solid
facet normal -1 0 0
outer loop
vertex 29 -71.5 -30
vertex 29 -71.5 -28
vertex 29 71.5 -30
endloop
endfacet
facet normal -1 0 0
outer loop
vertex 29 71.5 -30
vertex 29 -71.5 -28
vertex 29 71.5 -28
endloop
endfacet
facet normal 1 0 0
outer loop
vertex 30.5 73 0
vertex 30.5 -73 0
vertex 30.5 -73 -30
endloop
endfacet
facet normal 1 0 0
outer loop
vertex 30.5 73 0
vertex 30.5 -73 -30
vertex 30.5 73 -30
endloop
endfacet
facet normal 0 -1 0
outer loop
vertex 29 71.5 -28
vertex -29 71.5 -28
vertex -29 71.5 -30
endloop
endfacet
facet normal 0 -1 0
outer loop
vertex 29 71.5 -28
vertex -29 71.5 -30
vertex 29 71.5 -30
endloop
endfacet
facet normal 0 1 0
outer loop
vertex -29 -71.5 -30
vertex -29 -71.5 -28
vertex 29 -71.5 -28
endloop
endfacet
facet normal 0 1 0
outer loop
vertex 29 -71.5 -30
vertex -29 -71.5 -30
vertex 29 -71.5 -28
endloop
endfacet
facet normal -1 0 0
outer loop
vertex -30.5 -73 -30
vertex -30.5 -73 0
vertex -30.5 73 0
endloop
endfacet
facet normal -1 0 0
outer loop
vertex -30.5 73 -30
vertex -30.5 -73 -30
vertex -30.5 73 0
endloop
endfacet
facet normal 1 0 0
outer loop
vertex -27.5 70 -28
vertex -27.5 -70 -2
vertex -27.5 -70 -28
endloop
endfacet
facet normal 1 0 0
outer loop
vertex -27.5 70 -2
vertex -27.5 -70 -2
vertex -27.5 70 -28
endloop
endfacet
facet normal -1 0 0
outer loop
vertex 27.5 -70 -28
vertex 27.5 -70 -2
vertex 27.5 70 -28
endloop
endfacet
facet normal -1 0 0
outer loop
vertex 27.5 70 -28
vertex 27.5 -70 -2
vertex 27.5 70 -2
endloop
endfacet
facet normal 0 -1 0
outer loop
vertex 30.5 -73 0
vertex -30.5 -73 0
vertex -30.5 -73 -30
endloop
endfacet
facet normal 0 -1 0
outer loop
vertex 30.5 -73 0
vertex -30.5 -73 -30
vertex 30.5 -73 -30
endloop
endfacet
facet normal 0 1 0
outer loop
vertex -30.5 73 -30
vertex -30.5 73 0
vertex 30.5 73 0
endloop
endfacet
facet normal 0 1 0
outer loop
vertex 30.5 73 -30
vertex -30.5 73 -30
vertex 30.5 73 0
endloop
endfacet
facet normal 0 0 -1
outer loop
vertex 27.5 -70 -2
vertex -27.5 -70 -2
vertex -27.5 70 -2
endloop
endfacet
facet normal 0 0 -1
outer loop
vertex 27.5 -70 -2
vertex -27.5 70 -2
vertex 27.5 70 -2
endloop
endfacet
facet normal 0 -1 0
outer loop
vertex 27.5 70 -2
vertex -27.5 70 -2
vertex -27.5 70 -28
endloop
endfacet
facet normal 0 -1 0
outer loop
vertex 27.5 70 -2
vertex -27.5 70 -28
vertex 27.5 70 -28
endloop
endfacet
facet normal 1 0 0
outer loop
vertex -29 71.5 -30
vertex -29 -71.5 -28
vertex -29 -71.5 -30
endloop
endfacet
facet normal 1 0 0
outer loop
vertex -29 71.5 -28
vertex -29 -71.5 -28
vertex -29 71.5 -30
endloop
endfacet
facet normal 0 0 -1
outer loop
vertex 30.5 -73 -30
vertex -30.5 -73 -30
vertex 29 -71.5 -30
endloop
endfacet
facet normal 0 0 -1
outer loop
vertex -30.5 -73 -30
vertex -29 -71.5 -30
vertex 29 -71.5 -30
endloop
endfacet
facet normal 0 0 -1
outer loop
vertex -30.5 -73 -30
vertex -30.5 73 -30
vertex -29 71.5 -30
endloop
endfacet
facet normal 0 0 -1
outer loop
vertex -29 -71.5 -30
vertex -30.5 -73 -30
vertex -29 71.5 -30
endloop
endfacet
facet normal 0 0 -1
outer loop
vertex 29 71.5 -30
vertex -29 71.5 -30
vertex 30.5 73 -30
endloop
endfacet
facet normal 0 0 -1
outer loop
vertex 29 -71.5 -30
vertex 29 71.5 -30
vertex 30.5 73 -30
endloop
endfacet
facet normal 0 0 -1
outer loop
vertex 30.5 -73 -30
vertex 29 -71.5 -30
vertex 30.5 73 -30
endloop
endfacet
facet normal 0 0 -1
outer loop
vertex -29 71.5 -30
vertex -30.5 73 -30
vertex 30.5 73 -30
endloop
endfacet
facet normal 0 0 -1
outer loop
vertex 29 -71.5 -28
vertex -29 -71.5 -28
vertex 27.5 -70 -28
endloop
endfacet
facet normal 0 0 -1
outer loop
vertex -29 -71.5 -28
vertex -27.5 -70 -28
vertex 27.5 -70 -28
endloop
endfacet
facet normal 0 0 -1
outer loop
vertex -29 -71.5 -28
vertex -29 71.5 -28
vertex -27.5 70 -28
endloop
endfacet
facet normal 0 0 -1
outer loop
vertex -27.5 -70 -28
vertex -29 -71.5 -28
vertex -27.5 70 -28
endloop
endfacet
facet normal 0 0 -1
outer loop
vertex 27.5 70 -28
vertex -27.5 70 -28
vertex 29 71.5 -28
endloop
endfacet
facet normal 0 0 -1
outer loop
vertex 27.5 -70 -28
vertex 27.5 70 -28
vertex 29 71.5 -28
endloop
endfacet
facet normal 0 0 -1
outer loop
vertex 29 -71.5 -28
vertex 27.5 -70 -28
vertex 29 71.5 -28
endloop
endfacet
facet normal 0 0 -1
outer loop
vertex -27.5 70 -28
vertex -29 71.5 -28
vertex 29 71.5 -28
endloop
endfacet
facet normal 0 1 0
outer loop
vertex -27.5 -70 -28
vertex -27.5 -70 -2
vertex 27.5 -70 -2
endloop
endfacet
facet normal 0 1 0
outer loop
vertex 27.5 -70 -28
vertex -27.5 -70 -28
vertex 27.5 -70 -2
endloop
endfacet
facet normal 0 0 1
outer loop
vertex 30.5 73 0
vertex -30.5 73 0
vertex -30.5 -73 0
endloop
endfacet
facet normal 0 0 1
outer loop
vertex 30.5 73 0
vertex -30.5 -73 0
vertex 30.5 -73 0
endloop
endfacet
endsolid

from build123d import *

# Parameters (mm, degrees)
F0_W     = 61
F0_H     = 146
F0_W_2   = 58
F0_H_2   = 143
F0_W_3   = 55
F0_H_3   = 140
F1_DEPTH = 2
F2_DEPTH = 28
F3_DEPTH = 30


with BuildPart() as f1:
    # F0 (on Top) → F1 (new body)
    with BuildSketch(Plane.XY):
        Rectangle(F0_W, F0_H)
        Rectangle(F0_W_2, F0_H_2, mode=Mode.SUBTRACT)
        Rectangle(F0_W_2, F0_H_2)
        Rectangle(F0_W_3, F0_H_3, mode=Mode.SUBTRACT)
        Rectangle(F0_W_3, F0_H_3)
    extrude(amount=-F1_DEPTH)

    # F0 (on Top) → F2 (join)
    with BuildSketch(Plane.XY):
        Rectangle(F0_W, F0_H)
        Rectangle(F0_W_2, F0_H_2, mode=Mode.SUBTRACT)
        Rectangle(F0_W_2, F0_H_2)
        Rectangle(F0_W_3, F0_H_3, mode=Mode.SUBTRACT)
    extrude(amount=-F2_DEPTH)

    # F0 (on Top) → F3 (join)
    with BuildSketch(Plane.XY):
        Rectangle(F0_W, F0_H)
        Rectangle(F0_W_2, F0_H_2, mode=Mode.SUBTRACT)
    extrude(amount=-F3_DEPTH)


solid = f1.part
